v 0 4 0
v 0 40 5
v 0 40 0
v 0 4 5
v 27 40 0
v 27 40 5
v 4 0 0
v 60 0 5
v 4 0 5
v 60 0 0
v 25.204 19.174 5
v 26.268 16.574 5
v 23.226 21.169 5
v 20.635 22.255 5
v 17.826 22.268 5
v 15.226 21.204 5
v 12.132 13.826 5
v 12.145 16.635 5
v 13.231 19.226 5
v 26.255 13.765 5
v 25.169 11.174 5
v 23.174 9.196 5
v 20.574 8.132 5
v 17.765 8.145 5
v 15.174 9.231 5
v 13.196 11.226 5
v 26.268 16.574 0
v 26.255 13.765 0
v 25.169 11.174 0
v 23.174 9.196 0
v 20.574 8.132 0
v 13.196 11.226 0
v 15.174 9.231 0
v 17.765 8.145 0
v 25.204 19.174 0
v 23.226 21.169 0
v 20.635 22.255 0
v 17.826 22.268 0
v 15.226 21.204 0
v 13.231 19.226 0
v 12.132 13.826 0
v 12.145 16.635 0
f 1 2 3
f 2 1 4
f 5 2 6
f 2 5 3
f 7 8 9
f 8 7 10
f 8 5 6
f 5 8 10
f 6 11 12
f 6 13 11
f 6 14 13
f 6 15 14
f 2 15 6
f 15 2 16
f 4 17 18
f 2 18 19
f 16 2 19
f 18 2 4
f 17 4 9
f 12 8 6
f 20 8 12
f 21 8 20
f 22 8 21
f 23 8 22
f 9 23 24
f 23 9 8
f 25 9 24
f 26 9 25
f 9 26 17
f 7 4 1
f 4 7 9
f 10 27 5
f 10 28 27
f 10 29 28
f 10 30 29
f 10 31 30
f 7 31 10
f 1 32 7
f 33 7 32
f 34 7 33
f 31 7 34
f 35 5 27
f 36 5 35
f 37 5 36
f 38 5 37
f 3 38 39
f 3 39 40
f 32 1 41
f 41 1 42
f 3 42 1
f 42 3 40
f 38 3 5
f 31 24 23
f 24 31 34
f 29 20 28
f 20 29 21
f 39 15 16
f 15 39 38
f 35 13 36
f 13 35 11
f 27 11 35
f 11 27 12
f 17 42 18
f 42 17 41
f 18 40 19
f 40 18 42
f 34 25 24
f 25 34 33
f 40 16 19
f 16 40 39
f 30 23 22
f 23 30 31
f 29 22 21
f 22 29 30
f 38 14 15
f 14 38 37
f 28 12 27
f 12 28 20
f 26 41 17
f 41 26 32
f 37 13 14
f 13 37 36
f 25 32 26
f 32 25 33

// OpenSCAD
$fn = 32;

// ----------------------------------------------------------------------
// Bracket plate: gusset 60 x 40
// ----------------------------------------------------------------------

// --- parameters (mm) ---
hole_r = 3;               // bolt hole radius
plate_t = 5;              // plate thickness, Z (extrusion height)
gus_a = 60;               // base length
gus_b = 40;               // height
top_x = 27;               // top edge X of the angled cut
light_r = 7.2;            // lightening hole radius

light_d = 2 * light_r;

profile = [[4, 0], [30, 0], [60, 0], [27, 40], [0, 40], [0, 4]];  // primary outline, 6 points, counter clockwise
void_1 = [[26.268, 16.574], [25.204, 19.174], [23.226, 21.169], [20.635, 22.255], [17.826, 22.268], [15.226, 21.204], [13.231, 19.226], [12.145, 16.635], [12.132, 13.826], [13.196, 11.226], [15.174, 9.231], [17.765, 8.145], [20.574, 8.132], [23.174, 9.196], [25.169, 11.174], [26.255, 13.765]];  // lightening hole, 16 points

// --- the one profile operation ---
difference() {
  linear_extrude(height = plate_t) polygon(points = profile);
  translate([0, 0, -1])
    linear_extrude(height = plate_t + 2) polygon(points = void_1);
}
